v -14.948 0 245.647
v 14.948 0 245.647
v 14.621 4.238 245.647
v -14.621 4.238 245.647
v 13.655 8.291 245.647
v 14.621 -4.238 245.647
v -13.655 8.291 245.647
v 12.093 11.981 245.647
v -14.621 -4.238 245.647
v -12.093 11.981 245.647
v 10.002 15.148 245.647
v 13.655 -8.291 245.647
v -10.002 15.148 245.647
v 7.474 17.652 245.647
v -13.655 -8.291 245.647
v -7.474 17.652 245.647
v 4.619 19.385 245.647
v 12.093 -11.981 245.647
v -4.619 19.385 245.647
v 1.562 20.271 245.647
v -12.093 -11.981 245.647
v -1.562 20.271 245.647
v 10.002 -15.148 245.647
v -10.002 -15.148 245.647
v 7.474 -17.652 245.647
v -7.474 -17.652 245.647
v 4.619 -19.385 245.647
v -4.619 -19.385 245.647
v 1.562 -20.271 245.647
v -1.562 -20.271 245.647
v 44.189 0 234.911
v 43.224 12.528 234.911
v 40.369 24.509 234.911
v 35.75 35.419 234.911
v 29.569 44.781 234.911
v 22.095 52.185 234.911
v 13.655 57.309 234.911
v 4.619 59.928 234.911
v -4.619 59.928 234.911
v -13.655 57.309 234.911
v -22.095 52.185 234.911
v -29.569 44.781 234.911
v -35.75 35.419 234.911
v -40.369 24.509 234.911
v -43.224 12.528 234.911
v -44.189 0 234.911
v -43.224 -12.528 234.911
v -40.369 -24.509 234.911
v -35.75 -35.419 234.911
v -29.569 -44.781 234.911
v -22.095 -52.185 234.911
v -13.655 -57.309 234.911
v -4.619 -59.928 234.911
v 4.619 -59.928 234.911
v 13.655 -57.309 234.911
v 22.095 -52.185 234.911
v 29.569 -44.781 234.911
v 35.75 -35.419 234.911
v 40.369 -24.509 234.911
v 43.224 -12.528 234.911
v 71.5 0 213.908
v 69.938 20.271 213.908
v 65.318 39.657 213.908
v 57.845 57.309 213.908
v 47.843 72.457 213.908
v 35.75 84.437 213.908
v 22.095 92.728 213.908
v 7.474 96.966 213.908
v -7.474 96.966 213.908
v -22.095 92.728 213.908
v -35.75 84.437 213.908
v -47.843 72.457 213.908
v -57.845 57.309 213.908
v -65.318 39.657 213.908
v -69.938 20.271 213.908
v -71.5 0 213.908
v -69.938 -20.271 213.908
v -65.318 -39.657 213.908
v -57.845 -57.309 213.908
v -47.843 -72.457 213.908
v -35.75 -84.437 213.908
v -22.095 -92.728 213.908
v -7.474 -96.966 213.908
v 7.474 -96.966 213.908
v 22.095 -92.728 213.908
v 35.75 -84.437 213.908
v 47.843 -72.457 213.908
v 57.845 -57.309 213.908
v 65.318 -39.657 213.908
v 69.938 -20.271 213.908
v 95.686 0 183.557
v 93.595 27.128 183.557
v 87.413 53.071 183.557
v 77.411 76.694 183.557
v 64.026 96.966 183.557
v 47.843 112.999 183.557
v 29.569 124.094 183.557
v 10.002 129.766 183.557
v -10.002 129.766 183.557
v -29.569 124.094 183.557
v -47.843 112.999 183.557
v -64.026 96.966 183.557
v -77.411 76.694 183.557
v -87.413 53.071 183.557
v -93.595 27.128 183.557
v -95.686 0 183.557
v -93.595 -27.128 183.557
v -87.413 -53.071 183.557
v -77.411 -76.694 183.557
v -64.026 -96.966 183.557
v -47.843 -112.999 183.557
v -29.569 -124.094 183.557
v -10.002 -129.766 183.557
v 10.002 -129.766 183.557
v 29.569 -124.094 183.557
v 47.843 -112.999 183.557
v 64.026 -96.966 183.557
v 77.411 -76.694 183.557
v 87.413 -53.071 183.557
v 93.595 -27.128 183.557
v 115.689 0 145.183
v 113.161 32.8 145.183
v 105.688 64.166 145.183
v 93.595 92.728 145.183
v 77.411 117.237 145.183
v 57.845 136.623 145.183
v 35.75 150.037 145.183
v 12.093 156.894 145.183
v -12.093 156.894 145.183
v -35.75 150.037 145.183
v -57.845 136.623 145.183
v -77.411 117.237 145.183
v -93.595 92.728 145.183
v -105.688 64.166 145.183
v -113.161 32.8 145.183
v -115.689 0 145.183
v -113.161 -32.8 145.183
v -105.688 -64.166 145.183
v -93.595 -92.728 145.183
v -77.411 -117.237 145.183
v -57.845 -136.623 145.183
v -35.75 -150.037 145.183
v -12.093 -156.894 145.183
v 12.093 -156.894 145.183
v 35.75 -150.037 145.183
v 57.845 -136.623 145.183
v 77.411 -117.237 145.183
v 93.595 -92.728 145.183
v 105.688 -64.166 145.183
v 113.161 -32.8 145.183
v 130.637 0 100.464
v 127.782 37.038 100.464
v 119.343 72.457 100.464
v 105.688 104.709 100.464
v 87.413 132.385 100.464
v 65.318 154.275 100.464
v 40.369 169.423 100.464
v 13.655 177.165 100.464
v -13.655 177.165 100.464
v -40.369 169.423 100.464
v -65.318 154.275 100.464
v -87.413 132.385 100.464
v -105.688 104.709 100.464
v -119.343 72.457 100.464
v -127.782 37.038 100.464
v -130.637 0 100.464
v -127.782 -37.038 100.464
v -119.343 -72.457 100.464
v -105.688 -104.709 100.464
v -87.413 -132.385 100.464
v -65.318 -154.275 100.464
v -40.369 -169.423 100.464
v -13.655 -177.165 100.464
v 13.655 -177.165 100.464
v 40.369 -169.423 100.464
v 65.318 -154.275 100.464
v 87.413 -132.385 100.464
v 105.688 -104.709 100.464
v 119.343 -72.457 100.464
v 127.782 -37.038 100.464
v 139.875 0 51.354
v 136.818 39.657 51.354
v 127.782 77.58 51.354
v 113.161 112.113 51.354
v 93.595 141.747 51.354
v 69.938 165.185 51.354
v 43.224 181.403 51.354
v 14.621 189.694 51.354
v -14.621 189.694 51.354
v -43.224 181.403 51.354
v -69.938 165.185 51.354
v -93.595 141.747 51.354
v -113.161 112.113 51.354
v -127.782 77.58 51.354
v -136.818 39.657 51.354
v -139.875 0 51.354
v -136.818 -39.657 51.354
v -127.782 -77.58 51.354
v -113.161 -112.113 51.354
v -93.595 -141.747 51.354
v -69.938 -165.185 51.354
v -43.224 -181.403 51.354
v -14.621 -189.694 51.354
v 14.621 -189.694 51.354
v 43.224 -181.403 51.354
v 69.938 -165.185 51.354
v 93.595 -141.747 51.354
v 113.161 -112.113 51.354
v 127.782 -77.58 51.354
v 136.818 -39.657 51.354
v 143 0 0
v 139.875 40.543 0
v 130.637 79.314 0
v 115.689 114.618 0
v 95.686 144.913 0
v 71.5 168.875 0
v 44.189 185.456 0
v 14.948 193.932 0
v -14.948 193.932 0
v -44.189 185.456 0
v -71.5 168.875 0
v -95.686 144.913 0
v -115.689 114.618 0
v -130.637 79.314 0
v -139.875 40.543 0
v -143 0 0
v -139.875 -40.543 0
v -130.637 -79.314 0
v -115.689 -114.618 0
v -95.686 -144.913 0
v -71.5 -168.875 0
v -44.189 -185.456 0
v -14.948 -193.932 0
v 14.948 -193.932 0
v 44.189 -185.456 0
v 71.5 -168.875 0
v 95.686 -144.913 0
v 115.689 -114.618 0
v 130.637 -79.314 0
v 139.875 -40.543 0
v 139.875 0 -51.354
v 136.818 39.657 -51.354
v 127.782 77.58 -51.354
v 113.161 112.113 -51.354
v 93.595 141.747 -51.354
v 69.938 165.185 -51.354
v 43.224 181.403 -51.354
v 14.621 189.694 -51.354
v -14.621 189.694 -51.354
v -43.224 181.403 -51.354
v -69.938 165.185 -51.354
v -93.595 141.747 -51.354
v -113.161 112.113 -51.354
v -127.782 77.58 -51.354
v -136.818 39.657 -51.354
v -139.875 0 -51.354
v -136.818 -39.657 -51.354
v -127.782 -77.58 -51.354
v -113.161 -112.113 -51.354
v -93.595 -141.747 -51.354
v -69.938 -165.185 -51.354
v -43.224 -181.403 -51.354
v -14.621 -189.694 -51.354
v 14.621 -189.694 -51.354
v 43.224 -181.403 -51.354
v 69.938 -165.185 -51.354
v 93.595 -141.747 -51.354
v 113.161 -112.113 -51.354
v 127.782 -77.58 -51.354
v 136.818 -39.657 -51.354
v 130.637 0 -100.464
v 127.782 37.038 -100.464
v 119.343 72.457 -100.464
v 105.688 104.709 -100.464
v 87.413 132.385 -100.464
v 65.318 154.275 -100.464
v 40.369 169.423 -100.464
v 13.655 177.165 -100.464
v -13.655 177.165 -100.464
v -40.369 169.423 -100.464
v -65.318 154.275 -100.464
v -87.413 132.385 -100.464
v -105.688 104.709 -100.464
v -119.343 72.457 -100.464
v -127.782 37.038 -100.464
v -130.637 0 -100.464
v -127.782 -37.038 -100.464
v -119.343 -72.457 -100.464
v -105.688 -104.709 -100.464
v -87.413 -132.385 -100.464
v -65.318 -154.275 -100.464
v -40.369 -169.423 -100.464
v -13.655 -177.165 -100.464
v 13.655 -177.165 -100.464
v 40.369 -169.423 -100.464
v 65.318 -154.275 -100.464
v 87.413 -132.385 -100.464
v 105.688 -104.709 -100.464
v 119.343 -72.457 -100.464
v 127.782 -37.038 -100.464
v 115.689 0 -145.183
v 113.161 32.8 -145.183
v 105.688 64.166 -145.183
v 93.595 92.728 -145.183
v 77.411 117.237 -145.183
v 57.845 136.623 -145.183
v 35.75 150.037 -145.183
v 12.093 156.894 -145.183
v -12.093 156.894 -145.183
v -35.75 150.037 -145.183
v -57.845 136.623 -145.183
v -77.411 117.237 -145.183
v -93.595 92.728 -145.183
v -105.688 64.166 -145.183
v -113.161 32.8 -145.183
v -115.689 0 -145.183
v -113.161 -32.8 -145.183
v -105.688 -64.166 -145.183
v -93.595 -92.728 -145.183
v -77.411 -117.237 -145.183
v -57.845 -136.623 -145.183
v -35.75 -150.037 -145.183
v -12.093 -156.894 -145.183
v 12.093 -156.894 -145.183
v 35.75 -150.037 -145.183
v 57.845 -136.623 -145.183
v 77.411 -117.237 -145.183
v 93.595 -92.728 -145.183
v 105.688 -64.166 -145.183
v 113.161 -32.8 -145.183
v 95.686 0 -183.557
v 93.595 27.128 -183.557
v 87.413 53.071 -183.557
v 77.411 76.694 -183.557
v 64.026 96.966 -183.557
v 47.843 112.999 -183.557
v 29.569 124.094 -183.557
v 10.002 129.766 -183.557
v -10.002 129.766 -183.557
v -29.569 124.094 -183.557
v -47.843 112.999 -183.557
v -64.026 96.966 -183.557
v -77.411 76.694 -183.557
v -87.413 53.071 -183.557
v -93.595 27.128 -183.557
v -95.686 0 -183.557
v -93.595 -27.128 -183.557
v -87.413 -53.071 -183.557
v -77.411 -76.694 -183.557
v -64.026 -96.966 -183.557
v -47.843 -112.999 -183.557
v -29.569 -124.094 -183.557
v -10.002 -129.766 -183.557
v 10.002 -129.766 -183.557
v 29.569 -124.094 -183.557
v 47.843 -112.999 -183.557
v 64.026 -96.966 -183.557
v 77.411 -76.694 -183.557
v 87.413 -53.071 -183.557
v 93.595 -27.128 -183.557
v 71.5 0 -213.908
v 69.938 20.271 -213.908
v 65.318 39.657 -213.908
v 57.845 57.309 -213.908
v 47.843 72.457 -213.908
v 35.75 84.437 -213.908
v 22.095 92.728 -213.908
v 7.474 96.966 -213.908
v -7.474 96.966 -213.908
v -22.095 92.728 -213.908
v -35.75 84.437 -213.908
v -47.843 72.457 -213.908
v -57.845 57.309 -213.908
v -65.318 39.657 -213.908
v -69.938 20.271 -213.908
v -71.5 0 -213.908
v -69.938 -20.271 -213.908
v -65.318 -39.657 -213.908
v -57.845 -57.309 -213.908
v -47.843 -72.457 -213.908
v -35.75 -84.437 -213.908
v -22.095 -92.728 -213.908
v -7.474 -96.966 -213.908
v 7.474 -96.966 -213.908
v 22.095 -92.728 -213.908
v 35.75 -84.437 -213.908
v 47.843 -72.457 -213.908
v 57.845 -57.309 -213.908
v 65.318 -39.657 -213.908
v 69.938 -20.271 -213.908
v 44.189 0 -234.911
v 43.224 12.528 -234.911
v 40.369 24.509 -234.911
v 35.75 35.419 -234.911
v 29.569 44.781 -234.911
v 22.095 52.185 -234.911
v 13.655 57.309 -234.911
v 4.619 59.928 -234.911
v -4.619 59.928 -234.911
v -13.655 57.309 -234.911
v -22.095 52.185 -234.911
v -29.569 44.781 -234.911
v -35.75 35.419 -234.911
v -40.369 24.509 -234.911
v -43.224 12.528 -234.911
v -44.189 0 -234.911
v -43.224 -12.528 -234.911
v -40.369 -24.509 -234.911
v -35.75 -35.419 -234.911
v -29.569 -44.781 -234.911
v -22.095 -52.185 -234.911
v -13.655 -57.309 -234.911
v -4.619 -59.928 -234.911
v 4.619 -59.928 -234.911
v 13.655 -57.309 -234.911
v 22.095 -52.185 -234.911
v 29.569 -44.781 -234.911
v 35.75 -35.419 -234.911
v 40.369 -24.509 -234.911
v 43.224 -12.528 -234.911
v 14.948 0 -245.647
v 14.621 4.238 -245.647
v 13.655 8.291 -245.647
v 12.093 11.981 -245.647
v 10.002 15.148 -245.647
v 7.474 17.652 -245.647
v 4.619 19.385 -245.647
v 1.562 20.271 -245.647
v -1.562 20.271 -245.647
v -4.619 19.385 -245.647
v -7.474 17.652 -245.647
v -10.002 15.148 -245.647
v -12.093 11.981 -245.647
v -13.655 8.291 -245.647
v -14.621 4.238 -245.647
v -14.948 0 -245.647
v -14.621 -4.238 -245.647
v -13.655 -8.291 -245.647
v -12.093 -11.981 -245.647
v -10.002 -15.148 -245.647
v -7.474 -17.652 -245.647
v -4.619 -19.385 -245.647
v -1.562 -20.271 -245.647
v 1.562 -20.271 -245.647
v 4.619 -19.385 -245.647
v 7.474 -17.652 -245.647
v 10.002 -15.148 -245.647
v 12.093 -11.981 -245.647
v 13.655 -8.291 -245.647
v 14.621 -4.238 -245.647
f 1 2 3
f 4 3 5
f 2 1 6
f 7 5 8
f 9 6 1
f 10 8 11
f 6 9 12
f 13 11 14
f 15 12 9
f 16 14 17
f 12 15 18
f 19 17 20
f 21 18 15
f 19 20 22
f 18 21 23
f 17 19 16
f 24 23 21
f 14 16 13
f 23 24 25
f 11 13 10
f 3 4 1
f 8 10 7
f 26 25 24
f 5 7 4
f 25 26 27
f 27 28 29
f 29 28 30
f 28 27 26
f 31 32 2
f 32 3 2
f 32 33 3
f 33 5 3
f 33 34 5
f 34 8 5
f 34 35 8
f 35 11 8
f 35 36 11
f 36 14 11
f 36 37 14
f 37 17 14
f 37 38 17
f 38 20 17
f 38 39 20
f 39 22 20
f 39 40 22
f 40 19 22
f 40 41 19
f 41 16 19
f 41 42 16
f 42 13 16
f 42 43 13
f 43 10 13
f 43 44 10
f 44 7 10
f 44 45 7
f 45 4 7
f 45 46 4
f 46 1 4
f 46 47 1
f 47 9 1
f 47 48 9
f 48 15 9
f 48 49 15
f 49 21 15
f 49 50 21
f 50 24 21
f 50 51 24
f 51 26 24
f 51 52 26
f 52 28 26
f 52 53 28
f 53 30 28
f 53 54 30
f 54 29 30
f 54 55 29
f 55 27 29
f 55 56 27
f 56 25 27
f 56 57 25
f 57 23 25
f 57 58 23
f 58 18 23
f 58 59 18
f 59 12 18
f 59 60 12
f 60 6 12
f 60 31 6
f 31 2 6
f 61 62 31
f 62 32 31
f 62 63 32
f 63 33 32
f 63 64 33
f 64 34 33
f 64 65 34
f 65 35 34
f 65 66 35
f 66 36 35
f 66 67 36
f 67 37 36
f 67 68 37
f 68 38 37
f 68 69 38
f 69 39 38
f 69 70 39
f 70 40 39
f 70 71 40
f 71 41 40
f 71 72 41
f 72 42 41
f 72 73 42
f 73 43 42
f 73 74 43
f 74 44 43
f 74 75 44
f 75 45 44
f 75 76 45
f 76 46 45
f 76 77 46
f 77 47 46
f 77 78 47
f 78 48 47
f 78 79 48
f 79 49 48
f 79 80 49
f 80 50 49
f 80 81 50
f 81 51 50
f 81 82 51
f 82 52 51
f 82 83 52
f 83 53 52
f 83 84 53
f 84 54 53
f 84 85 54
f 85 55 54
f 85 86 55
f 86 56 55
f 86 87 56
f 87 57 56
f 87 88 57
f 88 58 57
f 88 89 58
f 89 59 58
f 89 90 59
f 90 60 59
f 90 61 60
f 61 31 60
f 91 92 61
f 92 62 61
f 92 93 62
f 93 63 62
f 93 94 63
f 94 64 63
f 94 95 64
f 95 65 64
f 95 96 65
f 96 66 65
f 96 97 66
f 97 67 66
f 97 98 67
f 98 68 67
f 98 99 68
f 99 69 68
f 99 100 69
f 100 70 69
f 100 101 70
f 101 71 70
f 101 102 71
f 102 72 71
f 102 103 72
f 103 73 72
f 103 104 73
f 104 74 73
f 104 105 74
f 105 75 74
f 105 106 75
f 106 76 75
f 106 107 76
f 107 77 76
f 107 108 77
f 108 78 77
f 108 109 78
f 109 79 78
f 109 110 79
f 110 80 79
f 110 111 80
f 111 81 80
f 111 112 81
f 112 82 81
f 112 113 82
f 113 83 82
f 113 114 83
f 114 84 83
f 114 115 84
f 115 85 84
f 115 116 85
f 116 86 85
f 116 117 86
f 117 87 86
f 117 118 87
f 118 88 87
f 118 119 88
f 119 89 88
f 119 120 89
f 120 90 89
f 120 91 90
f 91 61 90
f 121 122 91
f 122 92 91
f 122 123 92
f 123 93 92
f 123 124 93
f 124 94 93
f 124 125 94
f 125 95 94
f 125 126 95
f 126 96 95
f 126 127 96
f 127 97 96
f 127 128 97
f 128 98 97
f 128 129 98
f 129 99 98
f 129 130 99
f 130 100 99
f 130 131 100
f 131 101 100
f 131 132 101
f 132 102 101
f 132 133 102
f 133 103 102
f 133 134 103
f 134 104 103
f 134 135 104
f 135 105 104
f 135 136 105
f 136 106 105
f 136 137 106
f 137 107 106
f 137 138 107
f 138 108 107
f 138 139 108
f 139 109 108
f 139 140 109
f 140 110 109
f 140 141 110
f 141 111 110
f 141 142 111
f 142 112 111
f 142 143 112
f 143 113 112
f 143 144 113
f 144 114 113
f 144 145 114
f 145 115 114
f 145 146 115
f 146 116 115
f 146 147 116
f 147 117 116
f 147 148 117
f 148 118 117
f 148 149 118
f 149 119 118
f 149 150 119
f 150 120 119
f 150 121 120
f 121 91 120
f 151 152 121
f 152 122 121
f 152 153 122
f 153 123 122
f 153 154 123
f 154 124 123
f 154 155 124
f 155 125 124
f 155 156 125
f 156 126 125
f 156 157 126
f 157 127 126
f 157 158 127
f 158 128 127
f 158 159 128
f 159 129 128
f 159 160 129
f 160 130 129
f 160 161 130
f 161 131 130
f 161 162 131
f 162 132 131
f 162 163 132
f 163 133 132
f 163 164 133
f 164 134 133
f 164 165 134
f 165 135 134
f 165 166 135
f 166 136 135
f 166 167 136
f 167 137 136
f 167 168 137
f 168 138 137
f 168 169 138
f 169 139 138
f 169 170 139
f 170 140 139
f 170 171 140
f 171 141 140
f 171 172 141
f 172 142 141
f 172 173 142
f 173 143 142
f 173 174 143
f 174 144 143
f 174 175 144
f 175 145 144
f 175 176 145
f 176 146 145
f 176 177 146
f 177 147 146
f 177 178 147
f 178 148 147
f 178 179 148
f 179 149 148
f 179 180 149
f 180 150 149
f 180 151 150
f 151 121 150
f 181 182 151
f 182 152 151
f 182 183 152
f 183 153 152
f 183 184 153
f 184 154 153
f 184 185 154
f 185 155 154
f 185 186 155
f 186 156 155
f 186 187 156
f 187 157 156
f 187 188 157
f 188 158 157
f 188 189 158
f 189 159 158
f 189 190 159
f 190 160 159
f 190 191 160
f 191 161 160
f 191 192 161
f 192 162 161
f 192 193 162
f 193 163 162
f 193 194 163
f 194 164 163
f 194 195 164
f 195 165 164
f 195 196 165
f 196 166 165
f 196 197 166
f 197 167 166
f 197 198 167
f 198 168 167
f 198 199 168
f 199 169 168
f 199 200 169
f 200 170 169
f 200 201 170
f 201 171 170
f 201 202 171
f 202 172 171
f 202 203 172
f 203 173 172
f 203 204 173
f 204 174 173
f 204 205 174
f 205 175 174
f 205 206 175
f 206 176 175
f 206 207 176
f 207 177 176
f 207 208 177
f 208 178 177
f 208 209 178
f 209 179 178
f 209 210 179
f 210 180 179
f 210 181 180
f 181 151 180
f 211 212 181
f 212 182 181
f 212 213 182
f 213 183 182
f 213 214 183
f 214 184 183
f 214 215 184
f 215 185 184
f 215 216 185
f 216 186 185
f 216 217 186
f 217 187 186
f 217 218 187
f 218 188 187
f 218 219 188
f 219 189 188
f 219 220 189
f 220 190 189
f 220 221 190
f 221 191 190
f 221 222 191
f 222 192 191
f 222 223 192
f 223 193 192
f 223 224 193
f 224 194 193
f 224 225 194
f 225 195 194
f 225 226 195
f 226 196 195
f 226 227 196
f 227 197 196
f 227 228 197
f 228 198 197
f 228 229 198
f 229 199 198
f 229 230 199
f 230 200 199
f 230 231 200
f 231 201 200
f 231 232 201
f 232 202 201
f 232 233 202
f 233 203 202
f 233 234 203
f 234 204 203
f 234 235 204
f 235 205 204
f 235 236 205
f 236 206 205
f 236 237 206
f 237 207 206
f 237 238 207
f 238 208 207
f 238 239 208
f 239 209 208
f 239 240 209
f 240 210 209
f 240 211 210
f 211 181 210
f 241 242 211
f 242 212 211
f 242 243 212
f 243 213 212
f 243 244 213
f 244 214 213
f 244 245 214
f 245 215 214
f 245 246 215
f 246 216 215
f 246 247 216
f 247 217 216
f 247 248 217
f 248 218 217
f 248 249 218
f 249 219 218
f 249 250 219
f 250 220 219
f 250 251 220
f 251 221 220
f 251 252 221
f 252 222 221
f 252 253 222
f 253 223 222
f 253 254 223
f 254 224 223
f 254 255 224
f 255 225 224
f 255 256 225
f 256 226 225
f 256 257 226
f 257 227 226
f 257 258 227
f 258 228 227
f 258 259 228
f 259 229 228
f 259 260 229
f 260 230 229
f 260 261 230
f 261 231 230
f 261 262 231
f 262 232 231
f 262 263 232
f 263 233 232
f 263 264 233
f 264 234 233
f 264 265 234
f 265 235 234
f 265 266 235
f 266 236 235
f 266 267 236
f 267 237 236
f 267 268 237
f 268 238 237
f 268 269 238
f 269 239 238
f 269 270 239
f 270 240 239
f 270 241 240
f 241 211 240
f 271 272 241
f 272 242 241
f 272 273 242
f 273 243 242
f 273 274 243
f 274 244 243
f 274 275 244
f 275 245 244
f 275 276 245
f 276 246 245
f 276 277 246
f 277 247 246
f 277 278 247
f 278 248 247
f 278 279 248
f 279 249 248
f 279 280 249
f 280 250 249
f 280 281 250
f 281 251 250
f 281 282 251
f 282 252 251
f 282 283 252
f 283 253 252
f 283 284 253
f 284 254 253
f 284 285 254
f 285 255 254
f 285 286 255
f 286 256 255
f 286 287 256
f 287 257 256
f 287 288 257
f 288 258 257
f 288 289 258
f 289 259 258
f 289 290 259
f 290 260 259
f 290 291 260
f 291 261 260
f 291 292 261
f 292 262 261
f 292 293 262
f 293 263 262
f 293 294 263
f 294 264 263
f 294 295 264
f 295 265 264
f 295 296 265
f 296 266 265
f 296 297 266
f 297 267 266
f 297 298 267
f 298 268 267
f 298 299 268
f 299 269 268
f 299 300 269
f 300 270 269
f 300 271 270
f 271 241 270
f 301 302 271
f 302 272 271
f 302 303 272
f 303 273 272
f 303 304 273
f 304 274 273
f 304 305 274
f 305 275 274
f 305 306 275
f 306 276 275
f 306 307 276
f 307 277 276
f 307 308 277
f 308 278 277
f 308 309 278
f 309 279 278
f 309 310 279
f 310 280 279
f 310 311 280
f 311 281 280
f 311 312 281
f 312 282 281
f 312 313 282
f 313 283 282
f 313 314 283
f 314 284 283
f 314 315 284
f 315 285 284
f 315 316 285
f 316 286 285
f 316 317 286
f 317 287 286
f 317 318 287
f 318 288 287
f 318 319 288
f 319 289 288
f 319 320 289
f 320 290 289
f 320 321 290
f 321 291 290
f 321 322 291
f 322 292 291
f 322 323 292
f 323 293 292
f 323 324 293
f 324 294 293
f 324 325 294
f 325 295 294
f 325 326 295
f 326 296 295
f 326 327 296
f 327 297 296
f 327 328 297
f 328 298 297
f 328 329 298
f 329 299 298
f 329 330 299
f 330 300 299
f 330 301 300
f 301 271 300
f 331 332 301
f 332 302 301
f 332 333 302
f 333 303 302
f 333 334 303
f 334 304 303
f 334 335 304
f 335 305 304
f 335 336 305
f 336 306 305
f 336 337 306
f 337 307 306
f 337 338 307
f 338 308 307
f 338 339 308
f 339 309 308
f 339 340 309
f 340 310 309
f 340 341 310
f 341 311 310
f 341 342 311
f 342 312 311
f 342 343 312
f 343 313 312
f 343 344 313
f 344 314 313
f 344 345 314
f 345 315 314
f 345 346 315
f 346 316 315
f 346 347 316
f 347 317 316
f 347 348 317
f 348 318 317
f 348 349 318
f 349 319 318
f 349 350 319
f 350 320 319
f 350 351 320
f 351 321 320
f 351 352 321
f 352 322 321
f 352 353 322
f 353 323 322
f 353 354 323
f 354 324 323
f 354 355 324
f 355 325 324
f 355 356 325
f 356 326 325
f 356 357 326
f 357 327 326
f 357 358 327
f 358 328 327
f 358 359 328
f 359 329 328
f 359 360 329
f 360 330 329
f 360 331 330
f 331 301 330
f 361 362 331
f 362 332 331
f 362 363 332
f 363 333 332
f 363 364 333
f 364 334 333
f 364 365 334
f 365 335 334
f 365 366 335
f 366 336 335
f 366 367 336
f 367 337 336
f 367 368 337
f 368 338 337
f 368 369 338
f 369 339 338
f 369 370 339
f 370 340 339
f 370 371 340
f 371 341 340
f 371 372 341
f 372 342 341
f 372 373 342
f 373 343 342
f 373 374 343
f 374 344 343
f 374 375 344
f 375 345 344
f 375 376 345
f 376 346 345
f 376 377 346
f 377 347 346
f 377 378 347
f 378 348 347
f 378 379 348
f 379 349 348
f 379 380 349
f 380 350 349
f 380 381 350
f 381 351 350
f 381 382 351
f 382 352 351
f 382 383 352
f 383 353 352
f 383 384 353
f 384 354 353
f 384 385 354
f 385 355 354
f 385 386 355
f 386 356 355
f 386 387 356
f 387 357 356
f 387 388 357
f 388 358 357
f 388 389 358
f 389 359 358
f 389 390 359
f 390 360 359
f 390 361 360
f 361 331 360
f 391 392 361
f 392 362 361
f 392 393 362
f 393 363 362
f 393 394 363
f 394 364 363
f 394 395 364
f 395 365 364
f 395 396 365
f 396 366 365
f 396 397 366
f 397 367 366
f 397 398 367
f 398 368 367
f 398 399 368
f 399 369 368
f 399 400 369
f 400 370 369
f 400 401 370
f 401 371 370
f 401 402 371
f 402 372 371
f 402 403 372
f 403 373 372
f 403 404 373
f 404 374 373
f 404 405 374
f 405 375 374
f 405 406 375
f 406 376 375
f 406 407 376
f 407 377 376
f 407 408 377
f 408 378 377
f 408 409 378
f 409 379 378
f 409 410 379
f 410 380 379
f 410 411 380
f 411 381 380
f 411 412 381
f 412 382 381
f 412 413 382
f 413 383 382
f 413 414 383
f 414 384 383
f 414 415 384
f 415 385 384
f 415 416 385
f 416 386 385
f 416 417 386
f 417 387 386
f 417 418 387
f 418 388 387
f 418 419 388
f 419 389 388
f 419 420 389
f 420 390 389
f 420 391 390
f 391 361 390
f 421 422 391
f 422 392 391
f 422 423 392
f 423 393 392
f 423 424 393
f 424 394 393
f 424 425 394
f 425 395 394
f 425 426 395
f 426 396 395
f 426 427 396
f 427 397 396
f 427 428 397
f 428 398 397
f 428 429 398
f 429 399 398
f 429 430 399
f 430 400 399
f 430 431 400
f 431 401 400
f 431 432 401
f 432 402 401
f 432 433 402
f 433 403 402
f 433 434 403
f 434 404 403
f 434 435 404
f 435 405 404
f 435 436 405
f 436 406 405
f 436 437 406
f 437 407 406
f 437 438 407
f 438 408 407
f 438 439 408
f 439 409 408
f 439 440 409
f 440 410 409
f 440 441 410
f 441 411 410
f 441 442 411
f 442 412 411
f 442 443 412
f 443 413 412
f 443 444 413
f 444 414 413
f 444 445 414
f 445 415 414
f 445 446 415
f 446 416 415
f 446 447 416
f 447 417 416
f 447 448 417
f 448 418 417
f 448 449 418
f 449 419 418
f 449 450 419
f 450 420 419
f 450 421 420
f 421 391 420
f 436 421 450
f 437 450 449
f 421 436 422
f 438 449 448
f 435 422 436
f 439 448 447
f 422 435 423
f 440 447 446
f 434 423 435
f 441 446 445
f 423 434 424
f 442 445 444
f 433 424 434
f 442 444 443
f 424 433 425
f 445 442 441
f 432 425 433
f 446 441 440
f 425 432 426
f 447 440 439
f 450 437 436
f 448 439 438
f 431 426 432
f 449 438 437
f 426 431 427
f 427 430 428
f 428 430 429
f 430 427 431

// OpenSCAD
// Generated by SolidPython 1.0.1 on 2020-07-29 00:46:50


scale(v = [11, 15, 19]) {
	sphere(r = 13);
}
/***********************************************
*********      SolidPython code:      **********
************************************************
 
# import packages: SolidPython
from solid import *
from solid.utils import *
from itertools import chain, combinations, permutations


class Resize:

    def __init__(self, scad_file):
        self.scad_file = scad_file
        #self.scad_file = import_scad(scad_file)
        # cone/cylinder param:
        self.r1 = 0
        self.r2 = 0
        self.h = 0
        # rectangular prism param:
        self.w = 0
        self.l = 0
        # ellipse param:
        self.r = 0

    # import OpenScad code (file name corresponds to shape)


    # classify shape + parameters
    def assign(self, param1, param2, param3):
        if self.scad_file == 'cone.scad':
            self.r1 = param1
            self.r2 = param2
            self.h = param3
        elif self.scad_file == 'cylinder.scad':
            self.r1 = param1
            self.r2 = param2
            self.h = param3
        elif self.scad_file == 'rectangularPrism.scad':
            self.h = param1
            self.l = param2
            self.w = param3
        else:
            self.r = param1
            self.h = param2

    # resize parameters
    def iterate(self):
        x = range(3, 20, 2)
        i = 1
        if self.scad_file == 'cone.scad':
            tempList = list(permutations(x, 2))
            for temp in tempList:
                param1 = temp[0]
                param2 = temp[1]
                filepath = 'produced_scad_files/' + 'cone' + str(param1) + '_' + str(param2) + '_' + '.scad'
                scad_render_to_file(cylinder(h=param1, r1=param2, r2=0), filepath)

        elif self.scad_file == 'cylinder.scad':
            tempList = list(permutations(x, 3))
            for temp in tempList:
                param1 = temp[0]
                param2 = temp[1]
                filepath = 'produced_scad_files/' + 'cylinder' + str(param1) + '_' + str(param2) + '_' + '.scad'
                scad_render_to_file(cylinder(h=param1, r1=param2, r2=param2), filepath)

        elif self.scad_file == 'rectangularPrism.scad':
            tempList = list(permutations(x, 3))
            for temp in tempList:
                param1 = temp[0]
                param2 = temp[1]
                param3 = temp[2]
                filepath = 'produced_scad_files/' + 'rectangularPrism' + str(param1) + '_' + str(param2) + '_' + str(
                    param3) + '.scad'
                scad_render_to_file(cube(size=(param1, param2, param3)), filepath)

        elif self.scad_file == 'ellipse.scad':
            tempList = list(permutations(x, 4))
            for temp in tempList:
                param1 = temp[0]
                param2 = temp[1]
                param3 = temp[2]
                param4 = temp[3]
                filepath = 'produced_scad_files/' + 'ellipse' + str(param1) + '_' + str(param2) + '_' + str(param3) + '_' + str(param4) + '.scad'
                scad_render_to_file(scale([param1, param2, param3])(sphere(r=param4)), filepath)

    def render_to_scadfile(self):
        scad_render_to_file(scad, 'example.scad') 
 
************************************************/
